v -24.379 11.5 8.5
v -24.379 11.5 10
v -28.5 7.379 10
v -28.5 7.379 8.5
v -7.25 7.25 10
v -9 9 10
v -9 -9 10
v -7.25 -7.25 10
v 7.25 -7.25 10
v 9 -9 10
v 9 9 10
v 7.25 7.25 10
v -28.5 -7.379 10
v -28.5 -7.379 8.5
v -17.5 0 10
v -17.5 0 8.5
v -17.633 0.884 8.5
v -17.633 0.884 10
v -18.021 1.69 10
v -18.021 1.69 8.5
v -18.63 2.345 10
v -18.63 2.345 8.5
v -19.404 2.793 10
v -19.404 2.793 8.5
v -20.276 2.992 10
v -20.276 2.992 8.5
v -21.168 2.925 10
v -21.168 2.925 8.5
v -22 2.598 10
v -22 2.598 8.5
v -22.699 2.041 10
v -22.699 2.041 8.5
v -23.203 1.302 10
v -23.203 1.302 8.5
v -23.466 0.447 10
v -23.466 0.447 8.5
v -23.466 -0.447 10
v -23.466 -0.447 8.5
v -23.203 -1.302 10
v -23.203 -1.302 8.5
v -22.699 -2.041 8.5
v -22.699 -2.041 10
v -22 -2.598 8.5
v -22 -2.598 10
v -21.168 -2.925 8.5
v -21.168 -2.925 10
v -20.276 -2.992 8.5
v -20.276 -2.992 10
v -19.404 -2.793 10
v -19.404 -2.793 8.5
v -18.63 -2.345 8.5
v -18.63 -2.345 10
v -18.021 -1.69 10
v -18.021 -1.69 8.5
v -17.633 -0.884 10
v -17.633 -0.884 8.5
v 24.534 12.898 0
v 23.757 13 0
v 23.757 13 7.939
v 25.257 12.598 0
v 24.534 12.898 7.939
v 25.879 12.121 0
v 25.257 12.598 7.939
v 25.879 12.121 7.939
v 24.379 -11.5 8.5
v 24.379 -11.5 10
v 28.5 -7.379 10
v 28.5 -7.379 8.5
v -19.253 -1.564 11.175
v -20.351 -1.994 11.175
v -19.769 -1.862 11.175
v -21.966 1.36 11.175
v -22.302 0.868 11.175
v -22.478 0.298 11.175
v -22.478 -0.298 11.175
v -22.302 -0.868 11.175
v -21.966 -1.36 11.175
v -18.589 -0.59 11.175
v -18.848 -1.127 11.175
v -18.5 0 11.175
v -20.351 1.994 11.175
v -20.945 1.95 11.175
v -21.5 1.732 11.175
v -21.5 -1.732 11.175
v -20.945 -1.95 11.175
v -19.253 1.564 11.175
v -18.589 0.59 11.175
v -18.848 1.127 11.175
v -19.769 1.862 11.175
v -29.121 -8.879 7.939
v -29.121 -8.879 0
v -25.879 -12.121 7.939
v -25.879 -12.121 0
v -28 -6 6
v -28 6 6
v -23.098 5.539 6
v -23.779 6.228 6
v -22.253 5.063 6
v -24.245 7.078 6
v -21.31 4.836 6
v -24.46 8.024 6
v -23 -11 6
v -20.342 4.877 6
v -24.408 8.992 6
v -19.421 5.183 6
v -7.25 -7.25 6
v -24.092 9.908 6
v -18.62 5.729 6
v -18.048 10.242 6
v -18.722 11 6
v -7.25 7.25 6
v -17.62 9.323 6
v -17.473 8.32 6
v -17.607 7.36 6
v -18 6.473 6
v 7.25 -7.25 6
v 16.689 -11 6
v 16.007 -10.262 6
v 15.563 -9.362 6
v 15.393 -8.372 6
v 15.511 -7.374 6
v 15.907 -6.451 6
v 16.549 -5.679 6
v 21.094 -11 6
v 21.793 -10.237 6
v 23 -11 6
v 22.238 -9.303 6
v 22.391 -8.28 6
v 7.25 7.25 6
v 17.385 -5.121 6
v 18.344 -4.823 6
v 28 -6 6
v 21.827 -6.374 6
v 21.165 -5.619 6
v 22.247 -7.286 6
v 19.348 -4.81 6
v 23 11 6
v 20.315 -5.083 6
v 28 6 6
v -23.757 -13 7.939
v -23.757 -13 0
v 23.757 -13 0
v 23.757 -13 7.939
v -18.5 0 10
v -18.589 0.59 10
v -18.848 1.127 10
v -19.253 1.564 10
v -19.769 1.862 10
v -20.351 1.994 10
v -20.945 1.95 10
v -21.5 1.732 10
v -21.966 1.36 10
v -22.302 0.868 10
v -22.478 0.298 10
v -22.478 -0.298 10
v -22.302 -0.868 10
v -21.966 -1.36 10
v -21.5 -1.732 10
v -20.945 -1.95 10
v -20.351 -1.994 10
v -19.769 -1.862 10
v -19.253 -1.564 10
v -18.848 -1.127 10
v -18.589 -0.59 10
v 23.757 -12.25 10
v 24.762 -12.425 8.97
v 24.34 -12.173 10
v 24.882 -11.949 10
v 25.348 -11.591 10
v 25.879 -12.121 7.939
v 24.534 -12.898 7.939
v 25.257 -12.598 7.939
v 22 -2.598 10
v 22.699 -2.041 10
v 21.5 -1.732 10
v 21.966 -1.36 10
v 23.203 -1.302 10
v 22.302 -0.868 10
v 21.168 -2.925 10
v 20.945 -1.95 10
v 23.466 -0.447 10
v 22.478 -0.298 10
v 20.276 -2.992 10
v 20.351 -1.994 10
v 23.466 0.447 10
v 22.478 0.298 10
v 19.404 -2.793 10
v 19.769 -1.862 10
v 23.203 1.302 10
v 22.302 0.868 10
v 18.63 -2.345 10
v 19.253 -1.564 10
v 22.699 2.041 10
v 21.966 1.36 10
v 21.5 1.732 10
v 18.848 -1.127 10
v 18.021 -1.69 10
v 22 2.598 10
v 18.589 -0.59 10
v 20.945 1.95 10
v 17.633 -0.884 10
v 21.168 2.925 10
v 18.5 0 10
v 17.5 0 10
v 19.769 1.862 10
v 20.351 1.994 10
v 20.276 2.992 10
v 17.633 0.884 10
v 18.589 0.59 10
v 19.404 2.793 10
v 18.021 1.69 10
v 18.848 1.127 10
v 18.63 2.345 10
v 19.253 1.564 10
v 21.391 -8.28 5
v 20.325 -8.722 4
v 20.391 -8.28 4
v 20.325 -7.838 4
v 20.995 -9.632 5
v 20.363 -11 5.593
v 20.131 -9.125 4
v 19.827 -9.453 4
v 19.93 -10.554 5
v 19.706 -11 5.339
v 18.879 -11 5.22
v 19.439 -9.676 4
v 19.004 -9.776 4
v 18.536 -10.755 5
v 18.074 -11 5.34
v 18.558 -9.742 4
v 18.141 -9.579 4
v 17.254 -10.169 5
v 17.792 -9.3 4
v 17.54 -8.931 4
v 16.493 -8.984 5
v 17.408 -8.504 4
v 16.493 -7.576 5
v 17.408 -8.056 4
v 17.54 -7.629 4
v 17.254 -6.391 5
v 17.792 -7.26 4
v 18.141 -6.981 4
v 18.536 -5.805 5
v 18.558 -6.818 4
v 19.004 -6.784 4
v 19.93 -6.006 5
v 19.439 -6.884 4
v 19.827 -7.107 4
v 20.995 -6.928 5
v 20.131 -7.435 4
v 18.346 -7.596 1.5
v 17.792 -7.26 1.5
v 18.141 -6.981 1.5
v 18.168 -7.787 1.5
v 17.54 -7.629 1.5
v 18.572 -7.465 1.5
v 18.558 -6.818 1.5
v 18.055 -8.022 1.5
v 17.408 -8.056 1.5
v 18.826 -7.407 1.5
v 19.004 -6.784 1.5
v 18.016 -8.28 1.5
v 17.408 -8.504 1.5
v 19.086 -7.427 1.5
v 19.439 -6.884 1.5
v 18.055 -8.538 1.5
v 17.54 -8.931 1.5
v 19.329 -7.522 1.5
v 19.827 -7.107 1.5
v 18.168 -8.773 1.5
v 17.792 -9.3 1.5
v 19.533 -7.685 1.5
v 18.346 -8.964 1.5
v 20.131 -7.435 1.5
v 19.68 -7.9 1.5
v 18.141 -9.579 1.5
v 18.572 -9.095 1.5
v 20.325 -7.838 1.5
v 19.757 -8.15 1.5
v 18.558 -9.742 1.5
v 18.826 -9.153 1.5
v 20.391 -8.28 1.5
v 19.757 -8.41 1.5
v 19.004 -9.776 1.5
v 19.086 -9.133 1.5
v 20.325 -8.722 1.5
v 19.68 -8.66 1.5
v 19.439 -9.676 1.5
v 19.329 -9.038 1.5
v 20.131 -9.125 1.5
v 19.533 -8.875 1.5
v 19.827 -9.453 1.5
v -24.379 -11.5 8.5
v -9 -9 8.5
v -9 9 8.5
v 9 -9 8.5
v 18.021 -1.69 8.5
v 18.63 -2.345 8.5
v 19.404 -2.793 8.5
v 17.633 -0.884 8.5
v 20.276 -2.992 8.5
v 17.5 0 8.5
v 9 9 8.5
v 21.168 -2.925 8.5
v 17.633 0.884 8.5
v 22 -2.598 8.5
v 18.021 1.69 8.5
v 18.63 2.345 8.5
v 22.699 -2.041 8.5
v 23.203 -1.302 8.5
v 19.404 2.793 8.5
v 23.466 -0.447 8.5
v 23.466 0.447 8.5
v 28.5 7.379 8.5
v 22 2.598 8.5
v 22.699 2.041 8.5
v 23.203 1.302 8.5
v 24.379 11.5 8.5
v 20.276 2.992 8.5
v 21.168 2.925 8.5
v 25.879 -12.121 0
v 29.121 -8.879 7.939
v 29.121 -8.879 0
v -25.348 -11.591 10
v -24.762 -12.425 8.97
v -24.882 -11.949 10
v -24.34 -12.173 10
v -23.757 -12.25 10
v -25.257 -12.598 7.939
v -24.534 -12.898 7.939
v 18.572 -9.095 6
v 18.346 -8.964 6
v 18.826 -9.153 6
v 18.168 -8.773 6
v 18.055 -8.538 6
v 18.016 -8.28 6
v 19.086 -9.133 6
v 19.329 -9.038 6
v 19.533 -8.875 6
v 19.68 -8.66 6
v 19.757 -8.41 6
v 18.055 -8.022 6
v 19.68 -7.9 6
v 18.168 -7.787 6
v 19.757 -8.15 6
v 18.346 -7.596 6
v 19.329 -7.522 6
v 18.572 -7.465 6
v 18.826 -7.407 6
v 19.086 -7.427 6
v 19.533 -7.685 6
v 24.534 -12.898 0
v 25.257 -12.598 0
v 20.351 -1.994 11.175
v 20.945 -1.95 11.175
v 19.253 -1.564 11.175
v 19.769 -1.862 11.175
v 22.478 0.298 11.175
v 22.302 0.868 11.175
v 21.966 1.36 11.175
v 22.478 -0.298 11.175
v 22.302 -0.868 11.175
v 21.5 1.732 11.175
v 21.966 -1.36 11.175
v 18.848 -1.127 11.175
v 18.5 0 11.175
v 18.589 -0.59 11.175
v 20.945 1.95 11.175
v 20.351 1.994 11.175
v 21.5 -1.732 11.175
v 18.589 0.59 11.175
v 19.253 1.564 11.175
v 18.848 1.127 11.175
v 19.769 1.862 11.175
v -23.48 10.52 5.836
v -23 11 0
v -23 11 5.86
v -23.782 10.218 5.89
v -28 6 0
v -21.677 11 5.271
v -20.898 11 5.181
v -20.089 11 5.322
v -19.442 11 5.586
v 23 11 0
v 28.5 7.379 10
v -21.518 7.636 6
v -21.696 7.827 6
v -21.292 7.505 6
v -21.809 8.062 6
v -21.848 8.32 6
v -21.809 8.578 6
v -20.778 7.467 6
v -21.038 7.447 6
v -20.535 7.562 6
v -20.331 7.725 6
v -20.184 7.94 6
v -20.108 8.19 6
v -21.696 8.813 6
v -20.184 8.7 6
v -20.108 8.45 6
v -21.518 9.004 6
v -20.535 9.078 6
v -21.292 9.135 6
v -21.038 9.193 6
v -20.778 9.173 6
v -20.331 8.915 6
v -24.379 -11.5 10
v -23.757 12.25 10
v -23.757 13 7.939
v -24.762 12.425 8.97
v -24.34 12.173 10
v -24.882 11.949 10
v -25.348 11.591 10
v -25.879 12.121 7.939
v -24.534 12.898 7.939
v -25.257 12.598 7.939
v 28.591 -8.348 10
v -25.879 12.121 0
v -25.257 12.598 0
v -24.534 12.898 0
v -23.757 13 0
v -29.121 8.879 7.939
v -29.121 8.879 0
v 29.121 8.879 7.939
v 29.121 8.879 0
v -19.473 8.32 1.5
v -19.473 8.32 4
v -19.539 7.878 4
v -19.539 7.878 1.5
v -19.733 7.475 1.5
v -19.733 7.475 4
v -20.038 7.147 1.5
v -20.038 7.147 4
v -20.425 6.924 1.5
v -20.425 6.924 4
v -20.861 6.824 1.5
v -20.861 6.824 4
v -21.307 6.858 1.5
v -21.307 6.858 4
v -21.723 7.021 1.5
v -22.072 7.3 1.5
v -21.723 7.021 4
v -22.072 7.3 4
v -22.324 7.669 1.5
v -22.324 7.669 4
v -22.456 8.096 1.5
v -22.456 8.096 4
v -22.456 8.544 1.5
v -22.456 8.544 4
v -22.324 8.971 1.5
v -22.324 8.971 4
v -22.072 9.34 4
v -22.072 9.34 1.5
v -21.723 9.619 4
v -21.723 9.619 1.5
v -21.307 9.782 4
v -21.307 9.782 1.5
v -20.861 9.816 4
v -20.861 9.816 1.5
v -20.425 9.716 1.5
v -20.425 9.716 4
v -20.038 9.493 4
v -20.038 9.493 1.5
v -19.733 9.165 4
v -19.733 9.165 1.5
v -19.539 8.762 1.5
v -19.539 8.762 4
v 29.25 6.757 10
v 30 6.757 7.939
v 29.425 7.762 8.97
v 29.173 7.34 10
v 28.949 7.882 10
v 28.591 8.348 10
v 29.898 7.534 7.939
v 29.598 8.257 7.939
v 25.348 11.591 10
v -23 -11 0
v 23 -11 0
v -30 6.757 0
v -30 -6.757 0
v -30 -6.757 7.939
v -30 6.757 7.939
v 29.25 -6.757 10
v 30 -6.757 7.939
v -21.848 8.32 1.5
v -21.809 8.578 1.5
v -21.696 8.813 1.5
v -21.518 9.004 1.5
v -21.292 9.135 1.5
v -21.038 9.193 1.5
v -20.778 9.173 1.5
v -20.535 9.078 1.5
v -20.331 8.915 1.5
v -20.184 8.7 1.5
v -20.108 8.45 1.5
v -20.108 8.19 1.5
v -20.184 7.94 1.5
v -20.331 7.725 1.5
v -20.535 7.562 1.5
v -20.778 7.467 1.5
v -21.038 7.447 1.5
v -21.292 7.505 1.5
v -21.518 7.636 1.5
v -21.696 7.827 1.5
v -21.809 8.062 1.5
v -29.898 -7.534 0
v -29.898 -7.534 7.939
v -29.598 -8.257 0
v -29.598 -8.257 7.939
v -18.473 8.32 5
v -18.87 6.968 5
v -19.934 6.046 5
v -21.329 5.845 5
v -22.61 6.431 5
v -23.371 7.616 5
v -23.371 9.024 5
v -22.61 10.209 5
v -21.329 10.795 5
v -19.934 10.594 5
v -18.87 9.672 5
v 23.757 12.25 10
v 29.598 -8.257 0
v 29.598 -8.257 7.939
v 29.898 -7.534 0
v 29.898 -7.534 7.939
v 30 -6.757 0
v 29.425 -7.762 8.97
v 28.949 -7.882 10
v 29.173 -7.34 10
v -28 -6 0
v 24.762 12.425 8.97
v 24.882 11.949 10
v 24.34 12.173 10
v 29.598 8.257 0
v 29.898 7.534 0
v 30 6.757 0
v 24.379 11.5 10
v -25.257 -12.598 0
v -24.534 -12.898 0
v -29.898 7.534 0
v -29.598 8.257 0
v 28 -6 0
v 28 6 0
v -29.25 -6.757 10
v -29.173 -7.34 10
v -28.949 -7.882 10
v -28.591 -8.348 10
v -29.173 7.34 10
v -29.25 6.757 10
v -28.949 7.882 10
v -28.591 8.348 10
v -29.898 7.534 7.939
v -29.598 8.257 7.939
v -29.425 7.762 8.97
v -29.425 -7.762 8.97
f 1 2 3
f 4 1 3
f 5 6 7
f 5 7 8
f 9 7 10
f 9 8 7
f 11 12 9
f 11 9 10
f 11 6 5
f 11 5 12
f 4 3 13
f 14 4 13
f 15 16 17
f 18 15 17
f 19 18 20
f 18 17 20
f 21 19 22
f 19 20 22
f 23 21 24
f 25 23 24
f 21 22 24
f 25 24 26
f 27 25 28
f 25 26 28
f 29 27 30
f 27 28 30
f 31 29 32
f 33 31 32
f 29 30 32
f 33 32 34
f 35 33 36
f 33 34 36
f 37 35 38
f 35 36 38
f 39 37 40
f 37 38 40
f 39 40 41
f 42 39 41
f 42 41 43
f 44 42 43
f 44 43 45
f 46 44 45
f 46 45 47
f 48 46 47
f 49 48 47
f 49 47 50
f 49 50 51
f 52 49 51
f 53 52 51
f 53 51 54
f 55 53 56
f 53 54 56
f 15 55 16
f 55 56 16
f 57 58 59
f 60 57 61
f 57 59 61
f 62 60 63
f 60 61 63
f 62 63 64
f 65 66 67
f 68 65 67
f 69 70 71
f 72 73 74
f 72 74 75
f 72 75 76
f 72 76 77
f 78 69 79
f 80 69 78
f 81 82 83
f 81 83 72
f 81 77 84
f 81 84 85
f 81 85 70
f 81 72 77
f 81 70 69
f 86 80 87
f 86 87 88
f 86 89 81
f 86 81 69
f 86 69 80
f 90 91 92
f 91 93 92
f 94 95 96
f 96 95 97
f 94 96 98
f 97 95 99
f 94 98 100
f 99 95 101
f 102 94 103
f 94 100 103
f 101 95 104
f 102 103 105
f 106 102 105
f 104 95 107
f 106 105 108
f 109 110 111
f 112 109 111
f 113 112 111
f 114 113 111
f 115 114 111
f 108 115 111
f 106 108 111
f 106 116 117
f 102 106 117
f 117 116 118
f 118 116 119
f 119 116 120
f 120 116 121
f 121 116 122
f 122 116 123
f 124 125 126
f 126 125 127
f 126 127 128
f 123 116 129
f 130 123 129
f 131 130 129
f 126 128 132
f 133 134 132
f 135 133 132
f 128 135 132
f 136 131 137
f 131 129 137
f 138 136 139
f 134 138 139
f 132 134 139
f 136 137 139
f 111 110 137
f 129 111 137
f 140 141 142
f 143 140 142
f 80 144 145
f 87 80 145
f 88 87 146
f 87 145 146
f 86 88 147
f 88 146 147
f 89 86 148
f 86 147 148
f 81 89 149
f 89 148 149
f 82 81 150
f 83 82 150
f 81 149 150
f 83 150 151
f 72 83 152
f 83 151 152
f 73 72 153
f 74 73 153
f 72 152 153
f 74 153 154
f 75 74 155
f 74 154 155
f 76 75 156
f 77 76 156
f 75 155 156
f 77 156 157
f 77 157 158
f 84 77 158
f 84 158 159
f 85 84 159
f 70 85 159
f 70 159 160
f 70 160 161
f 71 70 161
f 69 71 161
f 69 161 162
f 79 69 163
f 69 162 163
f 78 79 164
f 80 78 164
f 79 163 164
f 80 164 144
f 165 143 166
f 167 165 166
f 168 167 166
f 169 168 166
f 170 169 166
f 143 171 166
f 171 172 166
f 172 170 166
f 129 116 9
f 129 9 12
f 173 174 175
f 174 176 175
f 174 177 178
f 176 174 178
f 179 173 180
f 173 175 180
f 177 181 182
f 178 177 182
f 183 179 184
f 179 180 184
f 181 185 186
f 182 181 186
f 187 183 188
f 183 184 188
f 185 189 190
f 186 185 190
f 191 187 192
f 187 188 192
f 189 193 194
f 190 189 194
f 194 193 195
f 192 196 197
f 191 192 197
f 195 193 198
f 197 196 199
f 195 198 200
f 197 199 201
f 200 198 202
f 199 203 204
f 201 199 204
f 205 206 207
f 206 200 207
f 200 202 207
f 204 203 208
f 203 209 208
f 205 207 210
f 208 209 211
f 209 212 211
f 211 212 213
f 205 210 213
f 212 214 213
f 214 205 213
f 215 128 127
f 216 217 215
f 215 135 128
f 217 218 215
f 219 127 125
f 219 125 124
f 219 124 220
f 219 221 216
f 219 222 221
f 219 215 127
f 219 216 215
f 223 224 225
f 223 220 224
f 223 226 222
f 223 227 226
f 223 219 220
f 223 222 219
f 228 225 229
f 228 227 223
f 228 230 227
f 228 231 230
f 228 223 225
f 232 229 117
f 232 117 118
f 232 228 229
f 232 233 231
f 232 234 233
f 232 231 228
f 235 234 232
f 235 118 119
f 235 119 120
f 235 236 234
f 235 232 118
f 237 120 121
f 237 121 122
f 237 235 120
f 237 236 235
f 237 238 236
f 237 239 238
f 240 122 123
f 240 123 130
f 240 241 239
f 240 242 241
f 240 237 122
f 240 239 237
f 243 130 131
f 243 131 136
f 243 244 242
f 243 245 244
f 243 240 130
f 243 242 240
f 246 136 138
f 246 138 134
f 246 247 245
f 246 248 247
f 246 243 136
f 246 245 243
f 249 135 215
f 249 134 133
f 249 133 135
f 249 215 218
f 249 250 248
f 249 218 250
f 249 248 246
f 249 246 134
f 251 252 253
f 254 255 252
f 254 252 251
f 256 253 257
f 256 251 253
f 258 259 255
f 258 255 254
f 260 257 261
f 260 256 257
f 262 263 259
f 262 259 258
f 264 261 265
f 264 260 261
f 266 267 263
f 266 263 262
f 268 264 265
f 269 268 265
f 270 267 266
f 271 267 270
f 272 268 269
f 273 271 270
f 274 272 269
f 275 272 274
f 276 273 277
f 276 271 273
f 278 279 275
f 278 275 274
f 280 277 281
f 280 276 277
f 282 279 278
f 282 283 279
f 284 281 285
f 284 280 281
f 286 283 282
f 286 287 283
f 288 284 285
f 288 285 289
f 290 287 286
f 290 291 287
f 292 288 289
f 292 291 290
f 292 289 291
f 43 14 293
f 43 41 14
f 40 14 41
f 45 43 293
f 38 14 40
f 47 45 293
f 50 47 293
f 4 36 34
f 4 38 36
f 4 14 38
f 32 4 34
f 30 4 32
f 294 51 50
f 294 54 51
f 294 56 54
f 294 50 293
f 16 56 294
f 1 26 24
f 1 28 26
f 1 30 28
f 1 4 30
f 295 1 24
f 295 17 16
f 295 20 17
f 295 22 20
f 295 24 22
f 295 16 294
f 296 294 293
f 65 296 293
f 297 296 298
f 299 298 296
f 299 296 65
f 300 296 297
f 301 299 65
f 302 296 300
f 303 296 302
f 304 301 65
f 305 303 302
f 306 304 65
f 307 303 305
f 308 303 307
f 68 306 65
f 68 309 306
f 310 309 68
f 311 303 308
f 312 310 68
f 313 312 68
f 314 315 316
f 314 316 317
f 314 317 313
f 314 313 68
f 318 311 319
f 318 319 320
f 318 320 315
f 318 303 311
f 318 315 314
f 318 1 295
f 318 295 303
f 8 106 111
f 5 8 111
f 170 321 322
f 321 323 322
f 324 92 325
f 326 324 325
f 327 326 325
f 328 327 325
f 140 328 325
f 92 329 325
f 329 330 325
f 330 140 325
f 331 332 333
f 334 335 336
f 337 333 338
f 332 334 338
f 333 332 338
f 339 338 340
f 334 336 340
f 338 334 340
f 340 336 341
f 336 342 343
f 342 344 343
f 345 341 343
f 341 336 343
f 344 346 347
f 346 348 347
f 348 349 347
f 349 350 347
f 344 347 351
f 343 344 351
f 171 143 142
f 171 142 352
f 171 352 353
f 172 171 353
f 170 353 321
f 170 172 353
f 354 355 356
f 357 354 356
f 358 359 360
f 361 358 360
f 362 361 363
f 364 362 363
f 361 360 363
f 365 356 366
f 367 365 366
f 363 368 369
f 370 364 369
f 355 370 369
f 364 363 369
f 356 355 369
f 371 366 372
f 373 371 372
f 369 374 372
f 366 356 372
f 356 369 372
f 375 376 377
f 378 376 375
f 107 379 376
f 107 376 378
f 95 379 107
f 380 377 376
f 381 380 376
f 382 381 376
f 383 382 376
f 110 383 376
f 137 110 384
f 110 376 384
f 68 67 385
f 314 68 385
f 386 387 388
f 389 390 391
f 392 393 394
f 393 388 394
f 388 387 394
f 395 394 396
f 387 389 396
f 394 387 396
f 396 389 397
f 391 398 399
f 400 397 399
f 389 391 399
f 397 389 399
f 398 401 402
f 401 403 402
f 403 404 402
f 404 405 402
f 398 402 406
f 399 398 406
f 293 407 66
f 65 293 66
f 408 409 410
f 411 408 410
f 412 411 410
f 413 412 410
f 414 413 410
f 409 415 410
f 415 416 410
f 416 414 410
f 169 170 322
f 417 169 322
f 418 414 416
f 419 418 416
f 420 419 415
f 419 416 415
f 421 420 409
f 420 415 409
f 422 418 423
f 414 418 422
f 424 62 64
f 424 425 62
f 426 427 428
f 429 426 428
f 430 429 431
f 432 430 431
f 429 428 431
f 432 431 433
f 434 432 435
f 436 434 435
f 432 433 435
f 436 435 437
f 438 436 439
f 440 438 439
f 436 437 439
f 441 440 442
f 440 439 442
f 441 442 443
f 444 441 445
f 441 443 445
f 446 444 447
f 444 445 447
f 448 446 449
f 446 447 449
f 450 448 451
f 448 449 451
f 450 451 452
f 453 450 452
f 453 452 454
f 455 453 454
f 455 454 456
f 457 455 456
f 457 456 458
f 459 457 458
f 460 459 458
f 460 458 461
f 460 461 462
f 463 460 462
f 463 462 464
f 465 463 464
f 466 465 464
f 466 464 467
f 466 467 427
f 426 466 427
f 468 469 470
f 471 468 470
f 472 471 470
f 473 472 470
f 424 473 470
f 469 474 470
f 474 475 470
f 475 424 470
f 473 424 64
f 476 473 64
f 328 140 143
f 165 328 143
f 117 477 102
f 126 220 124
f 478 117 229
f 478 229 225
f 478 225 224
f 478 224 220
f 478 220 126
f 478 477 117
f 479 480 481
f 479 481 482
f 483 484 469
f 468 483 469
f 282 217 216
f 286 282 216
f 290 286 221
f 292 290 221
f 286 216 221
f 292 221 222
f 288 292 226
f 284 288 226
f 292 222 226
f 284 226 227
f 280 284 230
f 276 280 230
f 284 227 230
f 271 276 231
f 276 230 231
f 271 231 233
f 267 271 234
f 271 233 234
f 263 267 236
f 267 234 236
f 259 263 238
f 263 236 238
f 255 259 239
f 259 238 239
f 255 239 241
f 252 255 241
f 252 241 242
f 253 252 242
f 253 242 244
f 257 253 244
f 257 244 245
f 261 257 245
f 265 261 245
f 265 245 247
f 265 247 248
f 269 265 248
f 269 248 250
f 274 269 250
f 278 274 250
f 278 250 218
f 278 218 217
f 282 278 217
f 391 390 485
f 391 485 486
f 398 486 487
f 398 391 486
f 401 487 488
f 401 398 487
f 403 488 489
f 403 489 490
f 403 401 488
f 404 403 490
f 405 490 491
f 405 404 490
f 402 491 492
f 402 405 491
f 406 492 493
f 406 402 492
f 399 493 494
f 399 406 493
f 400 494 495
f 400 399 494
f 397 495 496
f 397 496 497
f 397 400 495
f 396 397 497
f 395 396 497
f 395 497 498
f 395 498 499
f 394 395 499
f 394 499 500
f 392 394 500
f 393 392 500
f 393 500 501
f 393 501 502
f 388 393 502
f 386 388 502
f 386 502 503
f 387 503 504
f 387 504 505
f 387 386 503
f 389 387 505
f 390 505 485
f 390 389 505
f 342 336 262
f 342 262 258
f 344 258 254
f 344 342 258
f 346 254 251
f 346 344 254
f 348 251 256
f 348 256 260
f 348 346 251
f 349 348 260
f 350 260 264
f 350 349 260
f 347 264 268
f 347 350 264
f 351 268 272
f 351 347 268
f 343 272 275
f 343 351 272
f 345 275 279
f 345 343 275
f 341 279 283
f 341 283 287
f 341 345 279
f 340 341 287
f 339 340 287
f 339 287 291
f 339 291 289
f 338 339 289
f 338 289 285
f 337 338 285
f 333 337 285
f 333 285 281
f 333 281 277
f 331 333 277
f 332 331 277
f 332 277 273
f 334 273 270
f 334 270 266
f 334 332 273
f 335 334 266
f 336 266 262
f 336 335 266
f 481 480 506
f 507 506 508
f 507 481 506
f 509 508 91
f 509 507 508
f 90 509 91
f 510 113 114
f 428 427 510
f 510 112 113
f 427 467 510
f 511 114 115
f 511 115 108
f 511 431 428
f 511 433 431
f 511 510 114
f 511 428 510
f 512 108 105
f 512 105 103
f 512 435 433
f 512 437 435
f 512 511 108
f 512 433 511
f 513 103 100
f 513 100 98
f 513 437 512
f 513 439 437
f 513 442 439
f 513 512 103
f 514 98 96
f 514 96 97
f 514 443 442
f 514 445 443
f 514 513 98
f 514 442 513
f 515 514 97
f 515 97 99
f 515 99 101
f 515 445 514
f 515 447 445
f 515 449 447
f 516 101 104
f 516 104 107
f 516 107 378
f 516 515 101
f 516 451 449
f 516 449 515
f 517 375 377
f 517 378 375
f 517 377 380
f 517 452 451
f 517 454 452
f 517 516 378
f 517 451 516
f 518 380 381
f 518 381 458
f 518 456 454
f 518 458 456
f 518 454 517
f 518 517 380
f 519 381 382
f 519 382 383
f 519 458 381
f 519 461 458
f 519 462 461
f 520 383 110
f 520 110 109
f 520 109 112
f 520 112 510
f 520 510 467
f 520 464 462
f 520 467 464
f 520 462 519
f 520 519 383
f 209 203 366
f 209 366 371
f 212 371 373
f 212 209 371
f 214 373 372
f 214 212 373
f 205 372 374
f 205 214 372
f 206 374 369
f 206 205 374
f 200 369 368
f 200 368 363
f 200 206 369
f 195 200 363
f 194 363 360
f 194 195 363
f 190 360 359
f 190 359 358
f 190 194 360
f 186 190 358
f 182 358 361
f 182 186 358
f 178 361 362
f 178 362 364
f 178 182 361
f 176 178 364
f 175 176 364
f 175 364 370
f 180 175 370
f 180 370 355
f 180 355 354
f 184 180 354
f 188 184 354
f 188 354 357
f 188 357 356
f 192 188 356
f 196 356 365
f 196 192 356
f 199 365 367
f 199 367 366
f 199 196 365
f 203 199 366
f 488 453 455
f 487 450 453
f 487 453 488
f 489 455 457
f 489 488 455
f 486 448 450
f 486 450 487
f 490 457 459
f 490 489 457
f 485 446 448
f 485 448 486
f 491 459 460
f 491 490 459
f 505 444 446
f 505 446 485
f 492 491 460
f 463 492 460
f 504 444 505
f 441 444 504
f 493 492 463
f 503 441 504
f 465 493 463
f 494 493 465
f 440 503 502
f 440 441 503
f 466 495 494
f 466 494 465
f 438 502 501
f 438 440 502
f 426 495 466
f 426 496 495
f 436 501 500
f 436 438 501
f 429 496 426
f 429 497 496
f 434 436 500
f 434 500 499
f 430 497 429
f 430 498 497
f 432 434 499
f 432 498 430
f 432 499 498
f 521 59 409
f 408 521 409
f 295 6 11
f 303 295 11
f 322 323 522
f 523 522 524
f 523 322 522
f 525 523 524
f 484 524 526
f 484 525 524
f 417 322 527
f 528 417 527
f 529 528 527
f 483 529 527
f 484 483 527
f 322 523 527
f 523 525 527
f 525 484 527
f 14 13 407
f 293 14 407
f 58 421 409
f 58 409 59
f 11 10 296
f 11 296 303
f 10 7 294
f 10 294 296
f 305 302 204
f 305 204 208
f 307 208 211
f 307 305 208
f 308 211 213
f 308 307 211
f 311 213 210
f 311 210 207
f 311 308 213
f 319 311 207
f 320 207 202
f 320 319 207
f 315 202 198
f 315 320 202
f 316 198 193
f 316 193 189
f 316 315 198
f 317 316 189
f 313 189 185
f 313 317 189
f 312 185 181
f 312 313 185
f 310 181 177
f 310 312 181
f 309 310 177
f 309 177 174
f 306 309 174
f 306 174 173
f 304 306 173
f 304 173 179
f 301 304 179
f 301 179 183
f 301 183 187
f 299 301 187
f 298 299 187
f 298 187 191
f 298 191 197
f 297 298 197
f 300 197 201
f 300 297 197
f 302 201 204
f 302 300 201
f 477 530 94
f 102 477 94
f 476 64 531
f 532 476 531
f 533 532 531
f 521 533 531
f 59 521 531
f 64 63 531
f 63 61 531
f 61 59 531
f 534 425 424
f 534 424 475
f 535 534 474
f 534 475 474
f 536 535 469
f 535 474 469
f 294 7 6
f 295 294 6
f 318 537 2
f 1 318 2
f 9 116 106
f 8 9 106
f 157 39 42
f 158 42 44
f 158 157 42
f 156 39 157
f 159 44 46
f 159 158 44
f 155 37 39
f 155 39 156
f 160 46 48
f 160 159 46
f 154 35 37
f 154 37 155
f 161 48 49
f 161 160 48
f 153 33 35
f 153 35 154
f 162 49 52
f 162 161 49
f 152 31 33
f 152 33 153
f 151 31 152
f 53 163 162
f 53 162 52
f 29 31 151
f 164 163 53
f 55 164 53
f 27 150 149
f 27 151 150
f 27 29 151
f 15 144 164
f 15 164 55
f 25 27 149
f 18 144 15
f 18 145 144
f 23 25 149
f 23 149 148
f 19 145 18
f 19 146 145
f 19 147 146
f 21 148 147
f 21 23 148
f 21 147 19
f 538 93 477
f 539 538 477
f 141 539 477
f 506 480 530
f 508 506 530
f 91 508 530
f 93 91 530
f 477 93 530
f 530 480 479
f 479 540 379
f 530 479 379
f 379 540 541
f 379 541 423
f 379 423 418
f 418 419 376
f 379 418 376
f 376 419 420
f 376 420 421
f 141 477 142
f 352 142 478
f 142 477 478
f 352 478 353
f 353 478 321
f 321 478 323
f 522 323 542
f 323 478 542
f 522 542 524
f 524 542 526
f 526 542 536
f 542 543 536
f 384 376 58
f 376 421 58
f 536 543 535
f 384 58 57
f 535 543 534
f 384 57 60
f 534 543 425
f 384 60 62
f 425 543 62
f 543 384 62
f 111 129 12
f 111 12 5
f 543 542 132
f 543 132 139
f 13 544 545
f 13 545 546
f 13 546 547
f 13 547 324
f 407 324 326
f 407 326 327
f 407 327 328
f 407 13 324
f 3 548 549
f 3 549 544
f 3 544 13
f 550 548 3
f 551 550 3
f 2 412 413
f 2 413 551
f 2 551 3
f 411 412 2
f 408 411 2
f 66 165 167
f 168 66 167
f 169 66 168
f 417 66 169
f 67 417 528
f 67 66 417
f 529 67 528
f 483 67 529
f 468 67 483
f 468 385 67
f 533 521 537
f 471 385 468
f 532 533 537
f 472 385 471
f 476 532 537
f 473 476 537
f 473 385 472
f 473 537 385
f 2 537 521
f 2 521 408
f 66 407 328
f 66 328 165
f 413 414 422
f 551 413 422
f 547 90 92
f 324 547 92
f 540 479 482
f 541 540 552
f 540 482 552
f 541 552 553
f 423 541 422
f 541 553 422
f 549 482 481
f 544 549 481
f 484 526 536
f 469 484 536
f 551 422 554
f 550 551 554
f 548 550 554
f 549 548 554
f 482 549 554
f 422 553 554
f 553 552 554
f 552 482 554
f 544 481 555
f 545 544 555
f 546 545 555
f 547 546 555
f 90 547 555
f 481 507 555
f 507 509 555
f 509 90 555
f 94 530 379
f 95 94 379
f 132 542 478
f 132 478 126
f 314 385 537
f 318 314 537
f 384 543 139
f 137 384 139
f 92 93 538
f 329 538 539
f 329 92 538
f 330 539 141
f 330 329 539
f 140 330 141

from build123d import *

# Parameters (mm, degrees)
SKETCH1_W           = 60
SKETCH1_H           = 26
BOSS_EXTRUDE2_DEPTH = 10
SKETCH1_5_W         = 56
SKETCH1_5_H         = 22
CUT_EXTRUDE1_DEPTH  = 6
CHAMFER1_SIZE       = 5
SKETCH2_W           = 14.5
SKETCH2_H           = 14.5
CUT_EXTRUDE2_DEPTH  = 34.241540277
CHAMFER2_SIZE       = 5
SKETCH3_W           = 18
SKETCH3_H           = 18
CUT_EXTRUDE3_DEPTH  = 1.5
SKETCH4_R           = 3
BOSS_EXTRUDE4_DEPTH = 1.5
SKETCH5_R           = 2
BOSS_EXTRUDE5_DEPTH = 1.175
SKETCH6_R           = 1.5
SKETCH6_R_2         = 0.875
BOSS_EXTRUDE6_DEPTH = 4.5
CHAMFER3_SIZE       = 2
FILLET1_R           = 3
CHAMFER4_SIZE       = 0.75
CHAMFER4_SIZE2      = 2.060608065


with BuildPart() as part:
    # Sketch1 → Boss-Extrude2 (new body)
    with BuildSketch(Plane.XY):
        Rectangle(SKETCH1_W, SKETCH1_H)
    extrude(amount=BOSS_EXTRUDE2_DEPTH)

    # Sketch1<5> → Cut-Extrude1 (cut)
    with BuildSketch(Plane.XY):
        Rectangle(SKETCH1_5_W, SKETCH1_5_H)
    extrude(amount=CUT_EXTRUDE1_DEPTH, mode=Mode.SUBTRACT)

    # Chamfer1
    chamfer1_edges = [part.edges().sort_by_distance(p)[0] for p in [
        (28, 11, 3),
        (-28, 11, 3),
        (-28, -11, 3),
        (28, -11, 3),
    ]]
    chamfer(chamfer1_edges, length=CHAMFER1_SIZE)

    # Sketch2 → Cut-Extrude2 (cut, through all)
    with BuildSketch(Plane(origin=(0, 0, 6), x_dir=(-1, 0, 0), z_dir=(0, 0, -1))):
        Rectangle(SKETCH2_W, SKETCH2_H)
    extrude(amount=-CUT_EXTRUDE2_DEPTH, mode=Mode.SUBTRACT)

    # Chamfer2
    chamfer2_edges = [part.edges().sort_by_distance(p)[0] for p in [
        (30, 13, 5),
        (30, -13, 5),
        (-30, -13, 5),
        (-30, 13, 5),
    ]]
    chamfer(chamfer2_edges, length=CHAMFER2_SIZE)

    # Sketch3 → Cut-Extrude3 (cut)
    with BuildSketch(Plane.XY.offset(10)):
        Polygon((-28.5, 7.378679656), (-28.5, -7.378679656), (-24.378679656, -11.5), (24.378679656, -11.5), (28.5, -7.378679656), (28.5, 7.378679656), (24.378679656, 11.5), (-24.378679656, 11.5), align=None)
        Rectangle(SKETCH3_W, SKETCH3_H, mode=Mode.SUBTRACT)
    extrude(amount=-CUT_EXTRUDE3_DEPTH, mode=Mode.SUBTRACT)

    # Sketch4 → Boss-Extrude4 (add)
    with BuildSketch(Plane.XY.offset(8.5)):
        with Locations((-20.5, 0)):
            Circle(SKETCH4_R)
    boss_extrude4 = extrude(amount=BOSS_EXTRUDE4_DEPTH)

    # Sketch5 → Boss-Extrude5 (add)
    with BuildSketch(Plane.XY.offset(10)):
        with Locations((-20.5, 0)):
            Circle(SKETCH5_R)
    boss_extrude5 = extrude(amount=BOSS_EXTRUDE5_DEPTH)

    # Mirror1: Boss-Extrude4, Boss-Extrude5 across plane
    add(boss_extrude4.mirror(Plane(origin=(0, 0, 0), x_dir=(0, 0, 1), z_dir=(1, 0, 0))))
    add(boss_extrude5.mirror(Plane(origin=(0, 0, 0), x_dir=(0, 0, 1), z_dir=(1, 0, 0))))

    # Sketch6 → Boss-Extrude6 (add)
    # profile 1 of 2: a face of its own
    with BuildSketch(Plane(origin=(0, 0, 6), x_dir=(-1, 0, 0), z_dir=(0, 0, -1))):
        with Locations(Location((-18.891430022, -8.28, 0), (0, 0, 180))):
            Circle(SKETCH6_R)
        with Locations((-18.891430022, -8.28)):
            Circle(SKETCH6_R_2, mode=Mode.SUBTRACT)
    # profile 2 of 2: a face of its own
    with BuildSketch(Plane(origin=(0, 0, 6), x_dir=(-1, 0, 0), z_dir=(0, 0, -1))):
        with Locations(Location((20.972750365, 8.32, 0), (0, 0, 180))):
            Circle(SKETCH6_R)
        with Locations((20.972750365, 8.32)):
            Circle(SKETCH6_R_2, mode=Mode.SUBTRACT)
    extrude(amount=BOSS_EXTRUDE6_DEPTH)

    # Chamfer3
    # the kernel refuses this chamfer: 2 mm, written as the material it adds along each edge
    with BuildSketch(Plane(origin=(18.891430022, -8.28, 6), x_dir=(1, 0, 0), z_dir=(0, 1, 0))) as chamfer3_piece_1:
        Polygon((1.5 + CHAMFER3_SIZE, 0), (1.5, CHAMFER3_SIZE), (1.5, 0), align=None)
    revolve(axis=Axis((18.891430022, -8.28, 6), (0, 0, -1)))
    with BuildSketch(Plane(origin=(-20.972750365, 8.32, 6), x_dir=(1, 0, 0), z_dir=(0, 1, 0))) as chamfer3_piece_2:
        Polygon((1.5 + CHAMFER3_SIZE, 0), (1.5, CHAMFER3_SIZE), (1.5, 0), align=None)
    revolve(axis=Axis((-20.972750365, 8.32, 6), (0, 0, -1)))

    # Fillet1
    fillet1_edges = [part.edges().sort_by_distance(p)[0] for p in [
        (25, -13, 5),
        (-25, -13, 5),
        (-30, 8, 5),
        (-30, -8, 5),
        (30, 8, 5),
        (30, -8, 5),
        (-25, 13, 5),
        (25, 13, 5),
    ]]
    fillet(fillet1_edges, radius=FILLET1_R)

    # Chamfer4
    chamfer4_edges = [part.edges().sort_by_distance(p)[0] for p in [
        (30, 0, 10),
        (-30, 0, 10),
        (-27.5, -10.5, 10),
        (0, -13, 10),
        (27.5, -10.5, 10),
        (27.5, 10.5, 10),
        (0, 13, 10),
        (-27.5, 10.5, 10),
        (29.771638598, -7.90540961, 10),
        (24.90540961, -12.771638598, 10),
        (-24.90540961, -12.771638598, 10),
        (-29.771638598, -7.90540961, 10),
        (-29.771638598, 7.90540961, 10),
        (-24.90540961, 12.771638598, 10),
        (24.90540961, 12.771638598, 10),
        (29.771638598, 7.90540961, 10),
    ]]
    chamfer4_side = [part.faces().sort_by_distance(p)[0] for p in [
        (-29.346088691, 0, 10),
    ]]
    chamfer(chamfer4_edges, length=CHAMFER4_SIZE, length2=CHAMFER4_SIZE2, reference=chamfer4_side[0])


solid = part.part
